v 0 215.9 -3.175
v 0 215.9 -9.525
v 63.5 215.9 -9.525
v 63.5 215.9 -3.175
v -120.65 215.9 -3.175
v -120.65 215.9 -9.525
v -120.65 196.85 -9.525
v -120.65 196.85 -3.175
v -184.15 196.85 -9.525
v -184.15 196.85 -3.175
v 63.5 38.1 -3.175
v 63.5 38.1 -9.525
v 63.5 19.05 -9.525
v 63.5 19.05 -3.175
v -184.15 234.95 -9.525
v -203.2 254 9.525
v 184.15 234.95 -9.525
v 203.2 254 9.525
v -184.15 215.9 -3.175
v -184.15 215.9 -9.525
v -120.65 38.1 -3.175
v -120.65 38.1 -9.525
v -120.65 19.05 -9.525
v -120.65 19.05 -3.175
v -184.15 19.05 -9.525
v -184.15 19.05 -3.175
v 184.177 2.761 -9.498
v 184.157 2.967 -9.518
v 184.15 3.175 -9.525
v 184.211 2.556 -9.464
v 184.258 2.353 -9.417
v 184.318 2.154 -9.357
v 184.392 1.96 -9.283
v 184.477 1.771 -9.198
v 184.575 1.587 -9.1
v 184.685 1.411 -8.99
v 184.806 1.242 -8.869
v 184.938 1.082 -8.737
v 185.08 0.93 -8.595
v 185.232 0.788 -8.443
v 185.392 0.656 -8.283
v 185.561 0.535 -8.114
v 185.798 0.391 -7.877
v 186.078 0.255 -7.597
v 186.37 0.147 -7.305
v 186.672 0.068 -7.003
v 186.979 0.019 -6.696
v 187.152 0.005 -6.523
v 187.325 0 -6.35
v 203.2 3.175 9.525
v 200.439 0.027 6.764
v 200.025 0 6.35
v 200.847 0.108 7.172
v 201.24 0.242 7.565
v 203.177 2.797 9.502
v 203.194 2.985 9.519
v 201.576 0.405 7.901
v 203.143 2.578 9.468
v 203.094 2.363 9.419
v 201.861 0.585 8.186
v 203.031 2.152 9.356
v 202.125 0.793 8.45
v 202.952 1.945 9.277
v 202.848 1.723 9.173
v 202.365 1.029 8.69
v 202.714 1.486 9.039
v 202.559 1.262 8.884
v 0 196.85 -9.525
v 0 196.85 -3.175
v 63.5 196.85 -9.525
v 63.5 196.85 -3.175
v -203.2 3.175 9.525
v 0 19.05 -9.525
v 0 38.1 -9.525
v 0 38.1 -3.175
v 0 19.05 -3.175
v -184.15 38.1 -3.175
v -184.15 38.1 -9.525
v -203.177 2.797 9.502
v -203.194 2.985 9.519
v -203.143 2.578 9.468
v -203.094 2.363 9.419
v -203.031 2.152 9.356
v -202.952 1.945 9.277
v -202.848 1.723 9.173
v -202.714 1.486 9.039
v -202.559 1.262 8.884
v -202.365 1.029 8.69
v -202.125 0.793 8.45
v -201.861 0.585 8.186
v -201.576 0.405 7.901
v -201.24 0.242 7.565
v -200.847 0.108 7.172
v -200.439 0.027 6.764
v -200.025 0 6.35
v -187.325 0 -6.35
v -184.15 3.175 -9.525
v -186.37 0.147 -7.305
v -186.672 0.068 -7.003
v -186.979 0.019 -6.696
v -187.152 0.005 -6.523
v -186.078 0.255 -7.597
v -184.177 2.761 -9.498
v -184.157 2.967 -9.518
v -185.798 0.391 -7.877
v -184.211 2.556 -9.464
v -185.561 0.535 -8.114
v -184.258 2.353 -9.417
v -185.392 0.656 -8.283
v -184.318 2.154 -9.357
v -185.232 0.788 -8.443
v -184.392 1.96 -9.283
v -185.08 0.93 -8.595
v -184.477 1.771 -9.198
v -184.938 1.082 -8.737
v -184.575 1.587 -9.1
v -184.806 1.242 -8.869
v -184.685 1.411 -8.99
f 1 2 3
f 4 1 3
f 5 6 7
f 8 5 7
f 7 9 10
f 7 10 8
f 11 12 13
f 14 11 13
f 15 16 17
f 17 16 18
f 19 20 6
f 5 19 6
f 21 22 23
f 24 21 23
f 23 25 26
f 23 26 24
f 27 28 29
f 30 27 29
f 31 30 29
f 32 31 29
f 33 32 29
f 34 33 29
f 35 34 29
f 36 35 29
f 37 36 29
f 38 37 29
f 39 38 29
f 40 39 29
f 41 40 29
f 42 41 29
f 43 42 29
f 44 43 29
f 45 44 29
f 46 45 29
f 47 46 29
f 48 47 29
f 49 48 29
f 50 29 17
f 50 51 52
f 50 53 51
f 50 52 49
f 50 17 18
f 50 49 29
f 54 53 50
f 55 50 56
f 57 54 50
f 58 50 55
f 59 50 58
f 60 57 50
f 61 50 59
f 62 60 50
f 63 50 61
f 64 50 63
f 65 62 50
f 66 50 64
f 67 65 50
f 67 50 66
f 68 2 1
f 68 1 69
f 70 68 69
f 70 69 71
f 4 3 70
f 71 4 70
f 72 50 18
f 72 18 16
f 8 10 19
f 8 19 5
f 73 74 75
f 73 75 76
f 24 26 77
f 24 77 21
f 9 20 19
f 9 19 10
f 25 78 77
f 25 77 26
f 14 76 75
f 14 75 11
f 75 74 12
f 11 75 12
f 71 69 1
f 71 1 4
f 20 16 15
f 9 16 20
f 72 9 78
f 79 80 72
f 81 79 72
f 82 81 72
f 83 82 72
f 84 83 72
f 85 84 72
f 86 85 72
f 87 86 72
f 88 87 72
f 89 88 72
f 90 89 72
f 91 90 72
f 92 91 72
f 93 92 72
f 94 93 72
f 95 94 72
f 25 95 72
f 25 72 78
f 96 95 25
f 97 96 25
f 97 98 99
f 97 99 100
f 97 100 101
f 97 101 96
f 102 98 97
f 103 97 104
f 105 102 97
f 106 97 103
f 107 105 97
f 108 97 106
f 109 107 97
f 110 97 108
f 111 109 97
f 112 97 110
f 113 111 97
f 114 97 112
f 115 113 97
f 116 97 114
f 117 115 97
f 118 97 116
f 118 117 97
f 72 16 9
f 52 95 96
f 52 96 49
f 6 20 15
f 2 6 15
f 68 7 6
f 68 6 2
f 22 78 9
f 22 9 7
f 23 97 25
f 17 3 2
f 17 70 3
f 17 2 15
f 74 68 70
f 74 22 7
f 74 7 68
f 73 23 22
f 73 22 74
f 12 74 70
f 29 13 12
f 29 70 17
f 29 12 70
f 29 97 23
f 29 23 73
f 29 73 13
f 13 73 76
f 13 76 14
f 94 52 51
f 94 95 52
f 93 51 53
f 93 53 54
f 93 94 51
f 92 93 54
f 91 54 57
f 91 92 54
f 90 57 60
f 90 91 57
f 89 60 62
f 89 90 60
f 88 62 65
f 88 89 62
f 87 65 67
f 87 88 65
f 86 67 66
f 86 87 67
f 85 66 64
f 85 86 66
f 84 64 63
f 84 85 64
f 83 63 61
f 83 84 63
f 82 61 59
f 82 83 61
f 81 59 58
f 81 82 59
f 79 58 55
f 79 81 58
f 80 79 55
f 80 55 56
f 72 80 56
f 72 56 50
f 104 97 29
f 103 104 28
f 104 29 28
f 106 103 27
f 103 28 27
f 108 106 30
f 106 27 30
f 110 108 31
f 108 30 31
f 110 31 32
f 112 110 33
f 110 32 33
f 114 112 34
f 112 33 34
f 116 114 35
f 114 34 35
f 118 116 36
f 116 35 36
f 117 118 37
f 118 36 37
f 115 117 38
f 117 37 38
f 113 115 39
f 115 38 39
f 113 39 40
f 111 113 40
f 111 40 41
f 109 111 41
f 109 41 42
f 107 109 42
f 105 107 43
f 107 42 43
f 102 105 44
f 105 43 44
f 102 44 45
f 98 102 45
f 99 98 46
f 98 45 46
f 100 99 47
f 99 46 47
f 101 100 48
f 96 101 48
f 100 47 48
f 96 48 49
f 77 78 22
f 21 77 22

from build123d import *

# Parameters (mm, degrees)
F1_DEPTH = 254
F2_SIZE  = 19.04999
F3_W     = 63.5
F3_H     = 19.05
F4_DEPTH = 6.35
F5_R     = 3.175


# Not quite as in the source:
# - a fillet or chamfer is up to 0.001 mm smaller than in the source, because OpenCascade refuses the exact size


with BuildPart() as f1:
    # F0 (on Front) → F1 (new body)
    with BuildSketch(Plane.XZ):
        Polygon((203.2, 9.525), (-203.2, 9.525), (-184.15, -9.525), (184.15, -9.525), align=None)
    extrude(amount=-F1_DEPTH)

    # F2 (size 19.05 in the source; OpenCascade refuses exactly that, so slightly less here)
    f2_edges = [f1.edges().sort_by_distance(p)[0] for p in [
        (0, 254, -9.525),
    ]]
    chamfer(f2_edges, length=F2_SIZE)

    # F3 (on face) → F4 (cut)
    with BuildSketch(Plane(origin=(0, 0, -9.525), x_dir=(1, 0, 0), z_dir=(0, 0, -1))):
        with Locations((-152.4, -28.575)):
            Rectangle(F3_W, F3_H)
        with Locations((31.75, -28.575)):
            Rectangle(F3_W, F3_H)
        with Locations((31.75, -206.375)):
            Rectangle(F3_W, F3_H)
        with Locations((-152.4, -206.375)):
            Rectangle(F3_W, F3_H)
    extrude(amount=-F4_DEPTH, mode=Mode.SUBTRACT)

    # F5
    f5_edges = [f1.edges().sort_by_distance(p)[0] for p in [
        (0, 0, 9.525),
        (0, 0, -9.525),
    ]]
    fillet(f5_edges, radius=F5_R)


solid = f1.part
